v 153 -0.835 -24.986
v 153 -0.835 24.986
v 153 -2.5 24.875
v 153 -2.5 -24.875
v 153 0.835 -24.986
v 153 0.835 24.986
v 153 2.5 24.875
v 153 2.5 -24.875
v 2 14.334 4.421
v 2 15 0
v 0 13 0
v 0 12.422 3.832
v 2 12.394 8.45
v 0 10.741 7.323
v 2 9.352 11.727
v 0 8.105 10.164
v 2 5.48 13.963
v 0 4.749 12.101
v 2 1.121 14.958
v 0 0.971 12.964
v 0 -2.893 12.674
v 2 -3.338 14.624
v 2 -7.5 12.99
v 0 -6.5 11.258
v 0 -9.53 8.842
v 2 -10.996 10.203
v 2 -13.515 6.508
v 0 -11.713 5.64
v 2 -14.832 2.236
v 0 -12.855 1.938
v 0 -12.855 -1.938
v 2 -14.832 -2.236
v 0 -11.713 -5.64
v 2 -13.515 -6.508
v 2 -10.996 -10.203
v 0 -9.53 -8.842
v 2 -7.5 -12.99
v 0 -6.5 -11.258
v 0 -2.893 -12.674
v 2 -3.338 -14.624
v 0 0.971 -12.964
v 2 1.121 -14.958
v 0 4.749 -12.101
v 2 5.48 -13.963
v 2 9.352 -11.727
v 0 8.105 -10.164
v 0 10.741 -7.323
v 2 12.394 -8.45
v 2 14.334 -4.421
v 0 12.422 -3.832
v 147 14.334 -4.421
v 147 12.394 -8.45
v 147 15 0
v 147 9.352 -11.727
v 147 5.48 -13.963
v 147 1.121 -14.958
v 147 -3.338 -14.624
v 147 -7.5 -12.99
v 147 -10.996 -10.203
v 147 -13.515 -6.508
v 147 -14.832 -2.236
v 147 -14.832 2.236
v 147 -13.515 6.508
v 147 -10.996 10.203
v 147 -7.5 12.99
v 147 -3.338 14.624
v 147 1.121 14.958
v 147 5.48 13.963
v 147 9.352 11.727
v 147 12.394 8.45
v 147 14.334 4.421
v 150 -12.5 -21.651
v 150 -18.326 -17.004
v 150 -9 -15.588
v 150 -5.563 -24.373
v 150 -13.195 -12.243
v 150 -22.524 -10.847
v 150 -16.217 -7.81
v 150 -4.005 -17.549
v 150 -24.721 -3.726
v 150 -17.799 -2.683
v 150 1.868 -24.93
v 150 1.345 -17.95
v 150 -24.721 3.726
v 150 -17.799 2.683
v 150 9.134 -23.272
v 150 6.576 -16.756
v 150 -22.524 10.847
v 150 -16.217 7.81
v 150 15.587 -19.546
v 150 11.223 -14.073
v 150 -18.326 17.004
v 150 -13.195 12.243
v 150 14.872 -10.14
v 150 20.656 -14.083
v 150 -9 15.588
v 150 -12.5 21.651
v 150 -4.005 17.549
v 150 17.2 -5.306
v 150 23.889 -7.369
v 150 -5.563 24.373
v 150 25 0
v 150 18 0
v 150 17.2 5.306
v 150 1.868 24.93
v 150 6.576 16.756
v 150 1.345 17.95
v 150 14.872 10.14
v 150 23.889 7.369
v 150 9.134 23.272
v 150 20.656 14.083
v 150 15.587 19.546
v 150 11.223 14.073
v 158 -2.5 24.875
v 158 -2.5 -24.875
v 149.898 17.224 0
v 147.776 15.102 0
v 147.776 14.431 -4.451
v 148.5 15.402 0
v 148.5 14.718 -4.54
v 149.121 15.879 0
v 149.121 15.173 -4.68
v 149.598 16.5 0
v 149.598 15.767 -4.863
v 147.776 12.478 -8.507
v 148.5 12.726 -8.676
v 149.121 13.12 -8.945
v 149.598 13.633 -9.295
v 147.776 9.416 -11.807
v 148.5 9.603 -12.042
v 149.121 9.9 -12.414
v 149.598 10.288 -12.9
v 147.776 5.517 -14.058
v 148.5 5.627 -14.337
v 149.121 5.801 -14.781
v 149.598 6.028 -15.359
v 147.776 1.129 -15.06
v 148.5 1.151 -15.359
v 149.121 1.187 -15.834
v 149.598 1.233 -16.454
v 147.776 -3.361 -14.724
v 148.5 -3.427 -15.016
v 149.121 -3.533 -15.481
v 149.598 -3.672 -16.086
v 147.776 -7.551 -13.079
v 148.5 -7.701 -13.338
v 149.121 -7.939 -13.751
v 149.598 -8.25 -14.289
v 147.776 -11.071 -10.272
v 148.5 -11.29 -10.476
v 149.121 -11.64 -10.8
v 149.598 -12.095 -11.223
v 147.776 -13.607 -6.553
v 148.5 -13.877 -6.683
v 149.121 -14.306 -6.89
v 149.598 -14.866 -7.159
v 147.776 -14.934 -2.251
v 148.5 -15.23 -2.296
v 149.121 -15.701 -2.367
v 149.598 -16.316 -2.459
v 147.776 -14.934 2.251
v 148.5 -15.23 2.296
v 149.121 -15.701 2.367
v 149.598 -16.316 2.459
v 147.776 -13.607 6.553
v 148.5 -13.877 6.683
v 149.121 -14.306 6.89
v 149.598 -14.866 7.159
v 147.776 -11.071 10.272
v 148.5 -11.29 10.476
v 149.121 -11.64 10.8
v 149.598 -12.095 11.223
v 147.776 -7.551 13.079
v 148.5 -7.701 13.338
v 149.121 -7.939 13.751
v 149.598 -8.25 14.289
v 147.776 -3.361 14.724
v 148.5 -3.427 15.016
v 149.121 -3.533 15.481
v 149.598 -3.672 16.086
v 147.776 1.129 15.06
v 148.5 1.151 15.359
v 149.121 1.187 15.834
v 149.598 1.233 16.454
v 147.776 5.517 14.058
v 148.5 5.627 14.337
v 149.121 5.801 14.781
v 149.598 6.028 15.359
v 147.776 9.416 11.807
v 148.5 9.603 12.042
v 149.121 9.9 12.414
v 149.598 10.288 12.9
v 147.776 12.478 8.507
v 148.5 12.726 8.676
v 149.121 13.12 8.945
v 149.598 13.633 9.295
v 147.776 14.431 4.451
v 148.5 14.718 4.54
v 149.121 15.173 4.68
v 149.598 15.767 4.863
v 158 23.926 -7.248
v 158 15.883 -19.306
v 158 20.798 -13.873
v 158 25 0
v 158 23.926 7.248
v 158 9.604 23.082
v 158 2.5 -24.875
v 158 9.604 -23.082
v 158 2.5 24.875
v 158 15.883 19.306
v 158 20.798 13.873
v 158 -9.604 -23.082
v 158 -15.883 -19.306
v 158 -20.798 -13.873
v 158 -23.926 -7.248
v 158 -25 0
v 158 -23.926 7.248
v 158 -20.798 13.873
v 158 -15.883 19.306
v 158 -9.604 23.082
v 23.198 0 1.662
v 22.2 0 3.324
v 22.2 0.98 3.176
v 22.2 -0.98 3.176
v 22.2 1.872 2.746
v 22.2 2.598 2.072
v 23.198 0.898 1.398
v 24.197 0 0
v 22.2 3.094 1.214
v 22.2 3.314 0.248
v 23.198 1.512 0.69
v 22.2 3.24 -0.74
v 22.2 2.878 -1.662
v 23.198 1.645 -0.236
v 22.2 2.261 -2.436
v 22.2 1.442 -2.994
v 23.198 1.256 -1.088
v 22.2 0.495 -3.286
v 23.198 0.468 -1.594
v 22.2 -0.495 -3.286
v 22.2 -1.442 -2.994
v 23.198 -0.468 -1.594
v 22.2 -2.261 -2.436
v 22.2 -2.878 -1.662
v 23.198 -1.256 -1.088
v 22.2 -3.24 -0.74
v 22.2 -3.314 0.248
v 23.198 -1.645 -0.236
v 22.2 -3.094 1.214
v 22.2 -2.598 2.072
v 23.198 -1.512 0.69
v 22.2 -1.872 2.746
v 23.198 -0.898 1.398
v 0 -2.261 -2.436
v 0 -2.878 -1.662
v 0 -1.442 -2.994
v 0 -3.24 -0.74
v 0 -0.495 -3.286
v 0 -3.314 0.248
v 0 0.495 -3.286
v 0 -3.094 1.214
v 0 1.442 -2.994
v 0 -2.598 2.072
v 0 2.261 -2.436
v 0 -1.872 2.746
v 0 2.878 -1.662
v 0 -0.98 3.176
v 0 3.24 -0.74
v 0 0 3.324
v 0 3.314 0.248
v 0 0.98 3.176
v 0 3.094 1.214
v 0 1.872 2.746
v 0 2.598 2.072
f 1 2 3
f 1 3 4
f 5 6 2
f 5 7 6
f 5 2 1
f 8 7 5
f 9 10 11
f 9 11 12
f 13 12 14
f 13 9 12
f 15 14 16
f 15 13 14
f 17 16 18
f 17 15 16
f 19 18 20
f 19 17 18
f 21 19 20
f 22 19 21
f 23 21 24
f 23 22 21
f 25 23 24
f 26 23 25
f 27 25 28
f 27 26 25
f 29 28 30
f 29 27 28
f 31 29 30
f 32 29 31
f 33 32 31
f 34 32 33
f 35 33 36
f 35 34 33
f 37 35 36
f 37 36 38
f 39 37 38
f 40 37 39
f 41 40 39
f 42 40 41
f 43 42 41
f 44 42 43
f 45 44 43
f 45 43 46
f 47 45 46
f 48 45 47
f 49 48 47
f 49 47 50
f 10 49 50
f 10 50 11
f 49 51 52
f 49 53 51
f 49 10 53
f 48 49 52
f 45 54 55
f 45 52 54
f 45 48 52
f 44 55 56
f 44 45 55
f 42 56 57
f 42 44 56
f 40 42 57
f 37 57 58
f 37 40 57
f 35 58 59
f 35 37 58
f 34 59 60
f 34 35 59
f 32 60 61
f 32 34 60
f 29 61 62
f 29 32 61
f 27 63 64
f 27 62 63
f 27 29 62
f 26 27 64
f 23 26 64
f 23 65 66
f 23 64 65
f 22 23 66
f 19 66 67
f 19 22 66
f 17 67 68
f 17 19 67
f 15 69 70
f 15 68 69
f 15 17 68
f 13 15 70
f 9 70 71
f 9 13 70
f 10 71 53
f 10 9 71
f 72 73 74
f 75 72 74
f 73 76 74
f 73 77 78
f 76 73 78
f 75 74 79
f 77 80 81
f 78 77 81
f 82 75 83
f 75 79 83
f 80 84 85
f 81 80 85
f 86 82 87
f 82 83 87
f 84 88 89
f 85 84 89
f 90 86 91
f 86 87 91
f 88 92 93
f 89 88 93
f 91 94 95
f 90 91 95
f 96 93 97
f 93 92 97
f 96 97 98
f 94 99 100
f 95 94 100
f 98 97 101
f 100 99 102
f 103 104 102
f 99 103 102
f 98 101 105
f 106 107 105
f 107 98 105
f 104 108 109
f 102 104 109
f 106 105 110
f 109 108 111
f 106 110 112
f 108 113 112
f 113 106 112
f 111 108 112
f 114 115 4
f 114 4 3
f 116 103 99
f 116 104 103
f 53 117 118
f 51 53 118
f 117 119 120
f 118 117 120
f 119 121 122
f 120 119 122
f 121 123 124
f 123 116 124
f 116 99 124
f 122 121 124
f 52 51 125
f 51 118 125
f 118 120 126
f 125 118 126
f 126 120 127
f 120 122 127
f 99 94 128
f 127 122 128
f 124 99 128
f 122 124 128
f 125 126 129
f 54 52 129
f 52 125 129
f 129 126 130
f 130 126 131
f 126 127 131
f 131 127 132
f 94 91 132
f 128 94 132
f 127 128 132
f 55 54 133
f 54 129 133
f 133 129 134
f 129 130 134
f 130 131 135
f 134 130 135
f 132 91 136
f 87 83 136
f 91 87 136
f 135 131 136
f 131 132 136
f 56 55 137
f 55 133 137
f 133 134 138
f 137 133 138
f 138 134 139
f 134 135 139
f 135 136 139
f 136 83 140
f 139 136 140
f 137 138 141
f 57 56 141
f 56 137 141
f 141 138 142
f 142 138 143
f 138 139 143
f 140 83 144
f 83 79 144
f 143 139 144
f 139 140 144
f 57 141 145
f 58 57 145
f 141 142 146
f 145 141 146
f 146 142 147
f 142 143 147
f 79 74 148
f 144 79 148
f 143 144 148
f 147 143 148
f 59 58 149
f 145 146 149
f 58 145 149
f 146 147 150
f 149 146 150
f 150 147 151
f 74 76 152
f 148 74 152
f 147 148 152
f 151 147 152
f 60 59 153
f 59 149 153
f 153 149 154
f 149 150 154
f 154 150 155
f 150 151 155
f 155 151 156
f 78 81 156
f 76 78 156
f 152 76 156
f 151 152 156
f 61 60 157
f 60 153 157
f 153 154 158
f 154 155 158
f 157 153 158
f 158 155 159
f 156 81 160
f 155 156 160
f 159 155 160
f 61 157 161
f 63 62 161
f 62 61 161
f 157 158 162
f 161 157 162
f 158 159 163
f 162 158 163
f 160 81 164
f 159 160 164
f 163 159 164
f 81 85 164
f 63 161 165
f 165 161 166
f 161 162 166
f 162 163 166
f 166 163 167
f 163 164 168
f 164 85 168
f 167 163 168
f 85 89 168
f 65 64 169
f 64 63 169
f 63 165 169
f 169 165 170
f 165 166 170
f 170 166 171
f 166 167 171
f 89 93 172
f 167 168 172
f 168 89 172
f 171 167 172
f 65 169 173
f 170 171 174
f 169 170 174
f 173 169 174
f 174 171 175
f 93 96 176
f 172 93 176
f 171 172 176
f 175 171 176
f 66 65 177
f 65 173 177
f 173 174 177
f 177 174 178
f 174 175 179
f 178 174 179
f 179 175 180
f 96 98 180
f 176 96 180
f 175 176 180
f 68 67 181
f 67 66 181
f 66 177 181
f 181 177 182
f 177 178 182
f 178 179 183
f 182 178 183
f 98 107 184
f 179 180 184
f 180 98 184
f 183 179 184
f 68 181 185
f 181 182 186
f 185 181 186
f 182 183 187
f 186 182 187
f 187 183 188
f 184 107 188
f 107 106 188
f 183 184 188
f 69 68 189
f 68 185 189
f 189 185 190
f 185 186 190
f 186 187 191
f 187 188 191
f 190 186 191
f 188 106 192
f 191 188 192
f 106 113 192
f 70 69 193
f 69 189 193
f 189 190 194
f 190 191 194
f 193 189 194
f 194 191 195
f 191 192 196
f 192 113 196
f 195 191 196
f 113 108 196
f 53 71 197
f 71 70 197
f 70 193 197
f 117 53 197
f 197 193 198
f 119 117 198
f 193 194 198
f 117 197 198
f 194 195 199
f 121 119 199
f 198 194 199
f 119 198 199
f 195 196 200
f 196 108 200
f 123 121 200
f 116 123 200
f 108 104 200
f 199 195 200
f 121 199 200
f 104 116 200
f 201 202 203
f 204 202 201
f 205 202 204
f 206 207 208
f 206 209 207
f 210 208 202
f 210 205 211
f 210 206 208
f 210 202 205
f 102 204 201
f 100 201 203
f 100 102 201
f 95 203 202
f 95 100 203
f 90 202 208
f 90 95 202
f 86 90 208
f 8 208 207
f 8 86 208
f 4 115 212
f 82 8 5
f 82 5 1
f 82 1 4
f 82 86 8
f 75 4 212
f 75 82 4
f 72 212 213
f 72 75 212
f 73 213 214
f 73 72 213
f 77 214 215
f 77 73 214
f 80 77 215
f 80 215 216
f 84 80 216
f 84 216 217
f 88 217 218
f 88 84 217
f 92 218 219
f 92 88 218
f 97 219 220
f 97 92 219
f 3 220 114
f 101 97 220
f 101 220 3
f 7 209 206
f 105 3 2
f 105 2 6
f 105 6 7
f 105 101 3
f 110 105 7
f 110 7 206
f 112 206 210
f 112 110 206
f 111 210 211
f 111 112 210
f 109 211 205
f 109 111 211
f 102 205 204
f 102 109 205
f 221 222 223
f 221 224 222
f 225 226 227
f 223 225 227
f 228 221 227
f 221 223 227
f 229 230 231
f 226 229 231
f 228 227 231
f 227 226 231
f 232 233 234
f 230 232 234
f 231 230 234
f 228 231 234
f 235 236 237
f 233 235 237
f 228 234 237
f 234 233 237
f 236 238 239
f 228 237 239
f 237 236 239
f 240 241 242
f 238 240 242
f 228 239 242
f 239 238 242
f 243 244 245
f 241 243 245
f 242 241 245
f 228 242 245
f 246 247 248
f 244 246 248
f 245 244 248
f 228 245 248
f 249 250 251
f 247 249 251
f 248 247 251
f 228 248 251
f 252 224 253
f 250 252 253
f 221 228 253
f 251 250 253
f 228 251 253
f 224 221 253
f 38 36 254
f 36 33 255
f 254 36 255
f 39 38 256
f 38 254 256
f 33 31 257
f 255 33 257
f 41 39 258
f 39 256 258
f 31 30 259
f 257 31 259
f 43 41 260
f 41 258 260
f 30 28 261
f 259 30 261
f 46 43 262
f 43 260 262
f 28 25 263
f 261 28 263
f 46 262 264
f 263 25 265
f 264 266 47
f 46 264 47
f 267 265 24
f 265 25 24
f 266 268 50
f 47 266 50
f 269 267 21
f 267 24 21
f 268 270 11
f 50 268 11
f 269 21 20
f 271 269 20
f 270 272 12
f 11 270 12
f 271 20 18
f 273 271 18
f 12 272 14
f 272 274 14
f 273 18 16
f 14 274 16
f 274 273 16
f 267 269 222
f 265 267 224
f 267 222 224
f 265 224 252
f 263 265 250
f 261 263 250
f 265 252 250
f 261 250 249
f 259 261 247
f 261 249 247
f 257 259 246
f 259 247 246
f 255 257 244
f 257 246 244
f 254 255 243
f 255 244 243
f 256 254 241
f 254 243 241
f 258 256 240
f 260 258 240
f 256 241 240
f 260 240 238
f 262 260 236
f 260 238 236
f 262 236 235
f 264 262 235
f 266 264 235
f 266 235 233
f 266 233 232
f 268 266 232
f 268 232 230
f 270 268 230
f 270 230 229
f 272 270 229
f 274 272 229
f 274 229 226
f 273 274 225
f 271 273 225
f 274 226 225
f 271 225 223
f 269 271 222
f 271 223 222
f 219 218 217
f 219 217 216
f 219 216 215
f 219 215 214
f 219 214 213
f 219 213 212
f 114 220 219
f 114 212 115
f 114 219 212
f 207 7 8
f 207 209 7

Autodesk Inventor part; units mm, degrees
ref_plane "YZ Plane" through (0, 0, 0) normal (1, 0, 0) x (0, 1, 0)
ref_plane "XZ Plane" through (0, 0, 0) normal (0, 1, 0) x (-1, 0, 0)
ref_plane "XY Plane" through (0, 0, 0) normal (0, 0, 1) x (1, 0, 0)
sketch "Sketch1" plane through (0, 0, 0) normal (0, 0, 1) x (1, 0, 0)
  line L0 (0, 0) -> (150, 0)
  line L1 (150, 0) -> (150, 15)
  line L2 (150, 15) -> (0, 15)
  line L3 (0, 15) -> (0, 0)
  line L4 (150, 0) -> (158, 0)
  line L5 (158, 0) -> (158, 25)
  line L6 (158, 25) -> (150, 25)
  line L7 (150, 25) -> (150, 0)
  dimension "d0" = 15
  dimension "d1" = 25
  dimension "d2" = 150
  dimension "d3" = 8
revolve "Revolution1" add sketch "Sketch1" angle 360 about axis through (0, 0, 0) along (1, 0, 0)
fillet "Fillet1" radius 3 1 edges at (150, -15, 0)
chamfer "Chamfer1" distance 2 angle 45 1 edges at (0, -15, 0)
sketch "Sketch2" plane through (0, 0, 0) normal (-1, 0, 0) x (0, 0, 1)
  point P0 (0, 0)
  point P1 (0, 0)
hole "Hole1" at (0, 0, 0) direction (1, 0, 0) diameter 6.647 depth 22.2 tip angle 118 thread size "M8x1.25" class "6H" standard "ANSI Metric M Profile"
sketch "Sketch3" plane through (158, 0, 0) normal (1, 0, 0) x (0, 0, -1)
  line L0 (-25, 2.5) -> (25, 2.5)
  line L1 (25, 2.5) -> (25, -2.5)
  line L2 (25, -2.5) -> (-25, -2.5)
  line L3 (-25, -2.5) -> (-25, 2.5)
  circle A0 centre (0, 0) radius 18 projected
  circle A1 centre (0, 0) radius 25 projected
  dimension "d16" = 50
  dimension "d17" = 50
  dimension "d18" = 25
  dimension "d19" = 5
  dimension "d20" = 2.5
extrude "Extrusion1" cut sketch "Sketch3" against normal blind 5 contours L0 A1 L3 | L0 A0 L2 A1 | A1 L2 L3 | L0 A0 L2 | A1 L2 A0 L0 | L0 L1 A1 | L1 L2 A1
equation "\"d17\" = d16"
equation "\"d18\" = 0.5 * d17"
equation "\"d20\" = 0.5 * d19"
properties part number "Top_Hinge Cylinder Long" material "Stainless Steel"
